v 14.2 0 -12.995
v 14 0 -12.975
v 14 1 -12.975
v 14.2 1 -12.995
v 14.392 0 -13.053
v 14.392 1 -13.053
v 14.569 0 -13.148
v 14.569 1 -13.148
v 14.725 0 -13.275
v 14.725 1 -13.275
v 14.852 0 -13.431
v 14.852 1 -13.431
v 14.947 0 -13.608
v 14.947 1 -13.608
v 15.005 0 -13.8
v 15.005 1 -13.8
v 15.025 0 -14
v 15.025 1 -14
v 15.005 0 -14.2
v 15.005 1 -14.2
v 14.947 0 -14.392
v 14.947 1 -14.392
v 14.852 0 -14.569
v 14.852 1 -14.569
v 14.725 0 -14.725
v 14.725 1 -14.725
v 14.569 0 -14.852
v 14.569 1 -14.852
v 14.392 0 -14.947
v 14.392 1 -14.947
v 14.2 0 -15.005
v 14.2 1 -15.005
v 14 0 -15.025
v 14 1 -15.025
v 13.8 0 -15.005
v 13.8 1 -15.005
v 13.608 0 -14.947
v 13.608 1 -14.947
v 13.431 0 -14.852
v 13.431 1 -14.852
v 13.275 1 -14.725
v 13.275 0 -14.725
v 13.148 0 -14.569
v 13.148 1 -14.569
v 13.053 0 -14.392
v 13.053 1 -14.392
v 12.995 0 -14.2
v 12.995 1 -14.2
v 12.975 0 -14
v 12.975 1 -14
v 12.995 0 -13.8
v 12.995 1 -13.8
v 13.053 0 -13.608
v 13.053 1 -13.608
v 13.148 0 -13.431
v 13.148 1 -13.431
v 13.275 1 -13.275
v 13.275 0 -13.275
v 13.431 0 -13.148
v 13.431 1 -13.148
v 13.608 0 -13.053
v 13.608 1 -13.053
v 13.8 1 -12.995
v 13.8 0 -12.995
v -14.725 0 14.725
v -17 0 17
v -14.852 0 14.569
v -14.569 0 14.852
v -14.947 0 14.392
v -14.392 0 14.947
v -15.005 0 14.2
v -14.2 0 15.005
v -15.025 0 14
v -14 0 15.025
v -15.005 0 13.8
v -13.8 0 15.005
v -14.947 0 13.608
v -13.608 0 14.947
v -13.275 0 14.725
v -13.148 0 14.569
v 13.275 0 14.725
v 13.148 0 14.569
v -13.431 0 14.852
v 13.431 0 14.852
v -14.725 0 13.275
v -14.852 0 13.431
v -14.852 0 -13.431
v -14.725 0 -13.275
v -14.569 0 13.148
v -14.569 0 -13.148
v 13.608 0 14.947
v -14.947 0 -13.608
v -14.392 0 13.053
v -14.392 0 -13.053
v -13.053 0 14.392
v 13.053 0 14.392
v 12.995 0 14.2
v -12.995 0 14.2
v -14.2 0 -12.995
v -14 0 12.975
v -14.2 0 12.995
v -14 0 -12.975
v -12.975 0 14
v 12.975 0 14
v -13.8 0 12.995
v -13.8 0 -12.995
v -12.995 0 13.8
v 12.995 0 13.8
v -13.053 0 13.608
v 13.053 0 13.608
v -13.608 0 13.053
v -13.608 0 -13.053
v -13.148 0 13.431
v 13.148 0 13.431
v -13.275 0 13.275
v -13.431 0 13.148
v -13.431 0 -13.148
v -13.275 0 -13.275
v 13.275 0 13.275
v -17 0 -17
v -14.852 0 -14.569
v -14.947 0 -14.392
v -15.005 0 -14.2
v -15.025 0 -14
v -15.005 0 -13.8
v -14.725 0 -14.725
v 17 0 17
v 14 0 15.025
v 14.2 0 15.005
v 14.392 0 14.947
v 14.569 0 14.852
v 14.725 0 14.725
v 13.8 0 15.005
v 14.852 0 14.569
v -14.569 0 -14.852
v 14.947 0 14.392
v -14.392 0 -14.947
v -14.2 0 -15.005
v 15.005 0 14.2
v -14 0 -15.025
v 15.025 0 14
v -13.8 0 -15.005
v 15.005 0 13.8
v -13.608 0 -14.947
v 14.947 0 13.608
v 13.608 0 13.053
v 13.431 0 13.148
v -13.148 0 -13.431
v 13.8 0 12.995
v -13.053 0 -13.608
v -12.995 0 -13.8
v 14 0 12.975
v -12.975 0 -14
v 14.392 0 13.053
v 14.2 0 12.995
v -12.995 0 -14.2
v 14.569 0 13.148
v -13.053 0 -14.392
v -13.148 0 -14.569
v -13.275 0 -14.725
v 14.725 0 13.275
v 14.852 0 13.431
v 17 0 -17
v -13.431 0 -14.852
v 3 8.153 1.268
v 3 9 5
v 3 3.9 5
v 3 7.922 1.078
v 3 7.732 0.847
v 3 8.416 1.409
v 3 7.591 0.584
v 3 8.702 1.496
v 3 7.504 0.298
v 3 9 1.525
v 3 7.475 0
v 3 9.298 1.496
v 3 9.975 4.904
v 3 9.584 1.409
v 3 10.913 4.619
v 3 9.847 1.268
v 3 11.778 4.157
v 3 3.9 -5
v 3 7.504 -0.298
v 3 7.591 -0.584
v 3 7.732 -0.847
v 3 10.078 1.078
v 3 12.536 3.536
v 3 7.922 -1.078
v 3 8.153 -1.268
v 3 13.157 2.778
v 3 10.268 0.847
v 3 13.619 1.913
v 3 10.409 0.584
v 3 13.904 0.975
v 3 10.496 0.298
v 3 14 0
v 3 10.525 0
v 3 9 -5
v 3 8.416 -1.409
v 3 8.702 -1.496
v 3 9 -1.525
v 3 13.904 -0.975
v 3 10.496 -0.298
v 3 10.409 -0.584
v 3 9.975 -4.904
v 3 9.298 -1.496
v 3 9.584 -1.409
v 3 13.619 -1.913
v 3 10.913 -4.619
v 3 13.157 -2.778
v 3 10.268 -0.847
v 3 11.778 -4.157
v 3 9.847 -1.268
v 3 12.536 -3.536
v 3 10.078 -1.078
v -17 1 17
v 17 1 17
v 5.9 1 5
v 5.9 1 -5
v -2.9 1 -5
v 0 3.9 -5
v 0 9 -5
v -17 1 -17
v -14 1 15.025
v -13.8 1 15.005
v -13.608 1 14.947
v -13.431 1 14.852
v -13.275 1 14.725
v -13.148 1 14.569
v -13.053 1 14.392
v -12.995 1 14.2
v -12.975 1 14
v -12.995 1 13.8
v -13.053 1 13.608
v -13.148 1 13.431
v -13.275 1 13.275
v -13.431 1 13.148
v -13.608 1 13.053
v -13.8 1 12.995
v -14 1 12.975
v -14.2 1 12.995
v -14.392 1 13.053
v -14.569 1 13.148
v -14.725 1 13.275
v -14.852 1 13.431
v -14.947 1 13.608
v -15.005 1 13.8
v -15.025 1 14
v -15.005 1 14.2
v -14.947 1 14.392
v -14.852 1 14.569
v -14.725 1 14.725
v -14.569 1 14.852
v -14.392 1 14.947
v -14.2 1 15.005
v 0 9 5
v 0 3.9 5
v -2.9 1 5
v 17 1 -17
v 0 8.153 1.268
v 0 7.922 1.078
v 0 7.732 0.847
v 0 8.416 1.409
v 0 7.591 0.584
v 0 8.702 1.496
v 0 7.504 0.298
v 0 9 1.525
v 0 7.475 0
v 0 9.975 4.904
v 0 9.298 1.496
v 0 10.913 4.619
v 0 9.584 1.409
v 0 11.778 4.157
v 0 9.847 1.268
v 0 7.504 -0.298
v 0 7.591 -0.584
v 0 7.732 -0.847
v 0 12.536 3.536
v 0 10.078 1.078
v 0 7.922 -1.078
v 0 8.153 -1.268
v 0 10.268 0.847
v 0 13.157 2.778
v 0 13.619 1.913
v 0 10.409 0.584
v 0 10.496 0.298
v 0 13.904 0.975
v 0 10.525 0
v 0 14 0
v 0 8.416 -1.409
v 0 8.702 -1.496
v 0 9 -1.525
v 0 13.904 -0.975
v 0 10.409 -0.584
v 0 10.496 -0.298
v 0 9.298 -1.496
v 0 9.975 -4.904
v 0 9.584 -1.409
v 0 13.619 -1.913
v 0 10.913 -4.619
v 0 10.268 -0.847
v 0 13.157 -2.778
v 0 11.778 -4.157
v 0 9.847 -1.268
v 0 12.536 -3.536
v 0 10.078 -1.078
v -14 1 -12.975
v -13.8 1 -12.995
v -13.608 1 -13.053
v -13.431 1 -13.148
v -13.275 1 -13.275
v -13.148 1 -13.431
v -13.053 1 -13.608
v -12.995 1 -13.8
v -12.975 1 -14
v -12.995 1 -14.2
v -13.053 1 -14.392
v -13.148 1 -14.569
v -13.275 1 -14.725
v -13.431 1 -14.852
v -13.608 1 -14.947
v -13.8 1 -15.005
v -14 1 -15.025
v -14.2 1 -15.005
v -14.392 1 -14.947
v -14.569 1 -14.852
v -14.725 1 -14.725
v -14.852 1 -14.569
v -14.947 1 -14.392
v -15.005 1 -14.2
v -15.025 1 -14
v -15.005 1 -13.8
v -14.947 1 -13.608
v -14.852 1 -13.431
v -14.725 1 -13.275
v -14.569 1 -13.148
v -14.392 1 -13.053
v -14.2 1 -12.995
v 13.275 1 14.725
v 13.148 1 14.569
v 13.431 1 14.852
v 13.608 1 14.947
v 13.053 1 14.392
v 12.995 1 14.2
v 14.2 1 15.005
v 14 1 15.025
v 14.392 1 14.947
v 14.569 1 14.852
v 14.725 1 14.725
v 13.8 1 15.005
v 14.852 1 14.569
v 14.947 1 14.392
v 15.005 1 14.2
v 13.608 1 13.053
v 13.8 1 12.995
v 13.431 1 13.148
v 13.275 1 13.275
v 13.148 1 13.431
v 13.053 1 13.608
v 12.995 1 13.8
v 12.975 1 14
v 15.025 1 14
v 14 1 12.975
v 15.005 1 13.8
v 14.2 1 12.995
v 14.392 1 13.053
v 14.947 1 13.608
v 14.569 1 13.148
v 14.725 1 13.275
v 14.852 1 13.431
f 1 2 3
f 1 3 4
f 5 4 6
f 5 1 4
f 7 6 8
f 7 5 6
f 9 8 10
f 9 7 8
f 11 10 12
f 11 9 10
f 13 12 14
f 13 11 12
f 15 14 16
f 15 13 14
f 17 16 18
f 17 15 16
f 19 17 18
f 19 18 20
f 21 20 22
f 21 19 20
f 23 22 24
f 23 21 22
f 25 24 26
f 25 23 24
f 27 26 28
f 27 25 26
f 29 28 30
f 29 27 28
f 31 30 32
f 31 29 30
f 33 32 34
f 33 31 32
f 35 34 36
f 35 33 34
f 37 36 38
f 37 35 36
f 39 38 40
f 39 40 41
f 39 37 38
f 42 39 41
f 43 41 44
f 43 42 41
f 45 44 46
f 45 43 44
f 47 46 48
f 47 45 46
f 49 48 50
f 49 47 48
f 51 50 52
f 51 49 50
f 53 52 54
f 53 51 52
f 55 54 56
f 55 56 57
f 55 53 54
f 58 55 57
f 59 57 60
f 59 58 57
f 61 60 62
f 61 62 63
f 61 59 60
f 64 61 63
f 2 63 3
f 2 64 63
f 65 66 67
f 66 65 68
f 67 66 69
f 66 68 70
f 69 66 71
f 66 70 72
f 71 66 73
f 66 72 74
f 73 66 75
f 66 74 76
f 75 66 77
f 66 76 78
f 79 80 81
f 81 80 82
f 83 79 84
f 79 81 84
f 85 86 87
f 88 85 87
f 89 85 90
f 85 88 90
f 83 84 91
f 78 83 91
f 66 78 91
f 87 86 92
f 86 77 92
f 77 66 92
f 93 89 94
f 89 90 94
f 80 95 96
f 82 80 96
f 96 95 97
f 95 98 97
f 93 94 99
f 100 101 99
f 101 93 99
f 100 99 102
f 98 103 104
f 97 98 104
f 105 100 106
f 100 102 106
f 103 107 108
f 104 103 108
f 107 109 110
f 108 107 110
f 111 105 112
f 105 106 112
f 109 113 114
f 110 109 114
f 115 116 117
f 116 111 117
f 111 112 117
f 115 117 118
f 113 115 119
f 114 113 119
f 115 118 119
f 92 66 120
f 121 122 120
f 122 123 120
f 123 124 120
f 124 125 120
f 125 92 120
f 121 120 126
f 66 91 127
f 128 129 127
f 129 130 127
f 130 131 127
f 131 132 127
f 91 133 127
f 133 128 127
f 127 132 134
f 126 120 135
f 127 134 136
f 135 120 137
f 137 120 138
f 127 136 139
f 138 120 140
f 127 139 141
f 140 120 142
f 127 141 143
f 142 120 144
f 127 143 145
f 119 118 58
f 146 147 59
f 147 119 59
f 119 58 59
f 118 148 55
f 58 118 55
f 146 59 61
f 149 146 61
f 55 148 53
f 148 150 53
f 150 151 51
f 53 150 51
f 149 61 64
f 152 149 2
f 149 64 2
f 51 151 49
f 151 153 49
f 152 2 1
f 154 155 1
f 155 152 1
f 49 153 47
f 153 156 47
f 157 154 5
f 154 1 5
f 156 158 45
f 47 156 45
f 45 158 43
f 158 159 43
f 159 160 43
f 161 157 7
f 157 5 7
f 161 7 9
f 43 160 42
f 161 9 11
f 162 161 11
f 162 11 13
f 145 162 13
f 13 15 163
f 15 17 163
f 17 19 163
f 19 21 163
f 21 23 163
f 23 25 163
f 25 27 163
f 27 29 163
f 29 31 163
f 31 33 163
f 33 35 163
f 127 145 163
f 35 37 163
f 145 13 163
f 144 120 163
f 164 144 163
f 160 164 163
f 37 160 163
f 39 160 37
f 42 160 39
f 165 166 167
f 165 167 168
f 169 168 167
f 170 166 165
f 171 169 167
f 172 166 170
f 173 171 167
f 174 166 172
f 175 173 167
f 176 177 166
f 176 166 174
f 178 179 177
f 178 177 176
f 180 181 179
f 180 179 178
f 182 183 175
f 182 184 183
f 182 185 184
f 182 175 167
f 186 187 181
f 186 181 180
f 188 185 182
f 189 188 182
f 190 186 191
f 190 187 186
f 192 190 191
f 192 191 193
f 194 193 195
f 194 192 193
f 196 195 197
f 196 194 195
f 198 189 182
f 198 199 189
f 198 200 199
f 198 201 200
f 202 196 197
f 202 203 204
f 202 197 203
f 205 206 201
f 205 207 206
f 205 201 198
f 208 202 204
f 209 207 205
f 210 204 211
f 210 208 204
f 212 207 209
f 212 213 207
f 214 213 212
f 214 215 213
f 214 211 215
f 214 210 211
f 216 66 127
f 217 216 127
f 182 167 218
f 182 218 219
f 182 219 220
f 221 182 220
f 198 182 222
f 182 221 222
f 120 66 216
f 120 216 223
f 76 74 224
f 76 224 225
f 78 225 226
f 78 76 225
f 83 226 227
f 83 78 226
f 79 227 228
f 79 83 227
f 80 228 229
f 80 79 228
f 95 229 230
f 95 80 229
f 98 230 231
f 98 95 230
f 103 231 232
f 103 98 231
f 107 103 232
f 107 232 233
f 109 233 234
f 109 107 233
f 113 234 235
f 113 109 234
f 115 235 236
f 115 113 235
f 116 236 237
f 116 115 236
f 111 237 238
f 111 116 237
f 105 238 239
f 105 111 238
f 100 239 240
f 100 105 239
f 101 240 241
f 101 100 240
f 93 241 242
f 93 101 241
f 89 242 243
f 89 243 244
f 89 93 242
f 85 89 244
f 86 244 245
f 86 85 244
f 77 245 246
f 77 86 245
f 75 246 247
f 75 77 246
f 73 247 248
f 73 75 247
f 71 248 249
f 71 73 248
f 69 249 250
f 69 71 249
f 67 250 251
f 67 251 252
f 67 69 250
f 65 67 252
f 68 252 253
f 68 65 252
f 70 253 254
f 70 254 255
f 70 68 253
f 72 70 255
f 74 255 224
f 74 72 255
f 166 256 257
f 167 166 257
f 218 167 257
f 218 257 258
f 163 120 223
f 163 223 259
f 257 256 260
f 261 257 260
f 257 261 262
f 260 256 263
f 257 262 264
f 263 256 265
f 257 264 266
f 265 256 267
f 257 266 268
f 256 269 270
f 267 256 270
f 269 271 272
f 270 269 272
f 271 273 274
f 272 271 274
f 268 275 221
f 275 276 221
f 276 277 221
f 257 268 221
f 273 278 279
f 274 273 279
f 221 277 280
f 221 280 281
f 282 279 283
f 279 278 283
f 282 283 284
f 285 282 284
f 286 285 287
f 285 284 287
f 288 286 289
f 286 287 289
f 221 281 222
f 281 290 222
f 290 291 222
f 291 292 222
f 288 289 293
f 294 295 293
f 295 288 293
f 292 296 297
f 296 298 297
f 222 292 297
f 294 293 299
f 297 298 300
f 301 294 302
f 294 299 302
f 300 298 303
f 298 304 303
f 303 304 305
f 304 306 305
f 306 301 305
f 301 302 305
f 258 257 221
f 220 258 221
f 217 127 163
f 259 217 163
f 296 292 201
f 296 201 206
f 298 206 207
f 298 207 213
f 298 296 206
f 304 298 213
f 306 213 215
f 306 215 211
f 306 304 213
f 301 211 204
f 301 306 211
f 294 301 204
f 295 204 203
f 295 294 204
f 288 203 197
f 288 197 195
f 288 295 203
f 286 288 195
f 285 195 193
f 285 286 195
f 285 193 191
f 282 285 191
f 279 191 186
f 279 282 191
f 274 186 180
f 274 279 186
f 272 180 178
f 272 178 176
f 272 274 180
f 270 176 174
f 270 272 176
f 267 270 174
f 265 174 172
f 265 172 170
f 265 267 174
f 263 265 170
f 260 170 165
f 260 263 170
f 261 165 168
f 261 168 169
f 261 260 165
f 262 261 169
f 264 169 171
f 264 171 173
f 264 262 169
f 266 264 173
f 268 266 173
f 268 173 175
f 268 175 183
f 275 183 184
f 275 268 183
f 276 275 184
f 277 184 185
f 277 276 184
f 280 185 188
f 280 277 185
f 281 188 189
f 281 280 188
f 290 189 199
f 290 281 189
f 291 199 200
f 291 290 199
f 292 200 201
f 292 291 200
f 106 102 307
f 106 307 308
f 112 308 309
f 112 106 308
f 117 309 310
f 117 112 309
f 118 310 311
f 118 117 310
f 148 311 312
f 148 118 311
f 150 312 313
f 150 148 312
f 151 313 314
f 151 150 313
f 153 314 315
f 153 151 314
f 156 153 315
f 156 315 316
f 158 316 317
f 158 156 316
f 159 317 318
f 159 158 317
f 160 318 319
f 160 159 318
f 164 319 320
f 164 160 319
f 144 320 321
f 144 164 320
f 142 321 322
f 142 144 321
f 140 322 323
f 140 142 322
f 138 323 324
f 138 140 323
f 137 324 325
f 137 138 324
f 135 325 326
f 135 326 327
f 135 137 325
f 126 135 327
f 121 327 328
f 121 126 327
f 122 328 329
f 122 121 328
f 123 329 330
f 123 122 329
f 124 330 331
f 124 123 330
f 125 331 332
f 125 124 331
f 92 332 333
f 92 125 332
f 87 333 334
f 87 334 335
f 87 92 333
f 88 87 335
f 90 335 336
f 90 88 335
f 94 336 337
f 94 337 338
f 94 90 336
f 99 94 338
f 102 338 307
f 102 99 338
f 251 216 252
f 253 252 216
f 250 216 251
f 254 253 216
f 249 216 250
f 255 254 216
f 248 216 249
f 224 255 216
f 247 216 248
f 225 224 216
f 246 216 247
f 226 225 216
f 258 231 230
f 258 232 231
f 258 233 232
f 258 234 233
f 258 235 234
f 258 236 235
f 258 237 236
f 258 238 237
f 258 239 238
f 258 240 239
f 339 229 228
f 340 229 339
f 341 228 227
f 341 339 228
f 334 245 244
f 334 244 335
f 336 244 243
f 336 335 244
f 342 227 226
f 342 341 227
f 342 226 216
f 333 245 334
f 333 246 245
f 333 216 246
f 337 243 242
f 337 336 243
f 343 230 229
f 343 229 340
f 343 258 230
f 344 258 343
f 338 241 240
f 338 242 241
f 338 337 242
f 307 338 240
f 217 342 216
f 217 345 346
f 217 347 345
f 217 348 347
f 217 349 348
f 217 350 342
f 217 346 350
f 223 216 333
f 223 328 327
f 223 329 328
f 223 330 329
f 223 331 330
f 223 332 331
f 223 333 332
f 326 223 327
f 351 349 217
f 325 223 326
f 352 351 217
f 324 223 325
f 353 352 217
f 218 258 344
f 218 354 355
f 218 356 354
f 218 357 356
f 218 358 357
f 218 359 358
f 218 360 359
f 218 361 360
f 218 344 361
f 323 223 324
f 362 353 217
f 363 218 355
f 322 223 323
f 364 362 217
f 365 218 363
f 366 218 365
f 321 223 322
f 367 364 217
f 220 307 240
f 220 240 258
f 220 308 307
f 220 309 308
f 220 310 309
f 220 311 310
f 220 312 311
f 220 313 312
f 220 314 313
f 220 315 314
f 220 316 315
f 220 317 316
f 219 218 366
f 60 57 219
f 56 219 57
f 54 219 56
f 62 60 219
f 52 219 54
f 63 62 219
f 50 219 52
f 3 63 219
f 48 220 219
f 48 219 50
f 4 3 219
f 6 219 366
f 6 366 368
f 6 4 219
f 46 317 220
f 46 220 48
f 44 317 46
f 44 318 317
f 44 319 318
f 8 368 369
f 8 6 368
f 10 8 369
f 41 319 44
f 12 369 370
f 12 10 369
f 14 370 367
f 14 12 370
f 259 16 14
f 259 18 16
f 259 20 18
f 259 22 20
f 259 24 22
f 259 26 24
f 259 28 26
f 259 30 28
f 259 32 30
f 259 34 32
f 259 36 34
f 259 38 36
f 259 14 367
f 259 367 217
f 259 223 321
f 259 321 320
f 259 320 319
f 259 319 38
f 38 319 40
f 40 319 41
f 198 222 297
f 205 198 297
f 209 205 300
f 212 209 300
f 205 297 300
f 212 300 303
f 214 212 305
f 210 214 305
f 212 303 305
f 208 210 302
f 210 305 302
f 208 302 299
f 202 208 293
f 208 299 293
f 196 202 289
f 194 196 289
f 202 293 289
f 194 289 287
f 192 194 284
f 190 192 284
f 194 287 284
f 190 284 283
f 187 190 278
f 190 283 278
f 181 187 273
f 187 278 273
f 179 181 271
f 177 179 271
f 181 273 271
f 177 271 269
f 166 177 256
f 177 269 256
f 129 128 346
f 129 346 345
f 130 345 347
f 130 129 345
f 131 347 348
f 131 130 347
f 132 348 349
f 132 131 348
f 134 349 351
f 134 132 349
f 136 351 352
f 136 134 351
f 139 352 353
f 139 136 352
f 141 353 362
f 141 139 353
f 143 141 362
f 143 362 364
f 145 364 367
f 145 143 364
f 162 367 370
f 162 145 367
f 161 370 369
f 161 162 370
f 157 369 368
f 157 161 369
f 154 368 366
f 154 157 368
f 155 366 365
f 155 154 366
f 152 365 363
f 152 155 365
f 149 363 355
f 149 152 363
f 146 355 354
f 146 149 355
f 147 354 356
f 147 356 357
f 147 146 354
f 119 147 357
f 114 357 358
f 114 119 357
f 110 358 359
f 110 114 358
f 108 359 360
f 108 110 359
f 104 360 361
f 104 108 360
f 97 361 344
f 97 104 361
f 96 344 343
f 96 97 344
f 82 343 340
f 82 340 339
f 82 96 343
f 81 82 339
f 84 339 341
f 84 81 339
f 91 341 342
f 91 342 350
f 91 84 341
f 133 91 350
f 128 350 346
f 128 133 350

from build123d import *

# Parameters (mm, degrees)
SKETCH1_W           = 34
SKETCH1_H           = 34
SKETCH1_R           = 1.025
BOSS_EXTRUDE1_DEPTH = 1
SKETCH4_R           = 1.525
BOSS_EXTRUDE2_DEPTH = 3
CHAMFER1_SIZE       = 2.9


with BuildPart() as part:
    # Sketch1 → Boss-Extrude1 (new body)
    with BuildSketch(Plane(origin=(0, 0, 0), x_dir=(1, 0, 0), z_dir=(0, 1, 0))):
        Rectangle(SKETCH1_W, SKETCH1_H)
        with Locations(Location((-14, 14, 0), (0, 0, 270))):
            Circle(SKETCH1_R, mode=Mode.SUBTRACT)
        with Locations(Location((14, 14, 0), (0, 0, 270))):
            Circle(SKETCH1_R, mode=Mode.SUBTRACT)
        with Locations(Location((14, -14, 0), (0, 0, 270))):
            Circle(SKETCH1_R, mode=Mode.SUBTRACT)
        with Locations(Location((-14, -14, 0), (0, 0, 270))):
            Circle(SKETCH1_R, mode=Mode.SUBTRACT)
    extrude(amount=BOSS_EXTRUDE1_DEPTH)

    # Sketch4 → Boss-Extrude2 (add)
    with BuildSketch(Plane(origin=(0, 0, 0), x_dir=(0, 0, -1), z_dir=(1, 0, 0))):
        with BuildLine():
            Line((-5, 1), (5, 1))
            Line((5, 1), (5, 9))
            ThreePointArc((5, 9), (0, 14), (-5, 9))
            Line((-5, 9), (-5, 1))
        make_face()
        with Locations((0, 9)):
            Circle(SKETCH4_R, mode=Mode.SUBTRACT)
    extrude(amount=BOSS_EXTRUDE2_DEPTH)

    # Chamfer1
    chamfer1_edges = [part.edges().sort_by_distance(p)[0] for p in [
        (3, 1, 0),
        (0, 1, 0),
    ]]
    chamfer(chamfer1_edges, length=CHAMFER1_SIZE)


solid = part.part
